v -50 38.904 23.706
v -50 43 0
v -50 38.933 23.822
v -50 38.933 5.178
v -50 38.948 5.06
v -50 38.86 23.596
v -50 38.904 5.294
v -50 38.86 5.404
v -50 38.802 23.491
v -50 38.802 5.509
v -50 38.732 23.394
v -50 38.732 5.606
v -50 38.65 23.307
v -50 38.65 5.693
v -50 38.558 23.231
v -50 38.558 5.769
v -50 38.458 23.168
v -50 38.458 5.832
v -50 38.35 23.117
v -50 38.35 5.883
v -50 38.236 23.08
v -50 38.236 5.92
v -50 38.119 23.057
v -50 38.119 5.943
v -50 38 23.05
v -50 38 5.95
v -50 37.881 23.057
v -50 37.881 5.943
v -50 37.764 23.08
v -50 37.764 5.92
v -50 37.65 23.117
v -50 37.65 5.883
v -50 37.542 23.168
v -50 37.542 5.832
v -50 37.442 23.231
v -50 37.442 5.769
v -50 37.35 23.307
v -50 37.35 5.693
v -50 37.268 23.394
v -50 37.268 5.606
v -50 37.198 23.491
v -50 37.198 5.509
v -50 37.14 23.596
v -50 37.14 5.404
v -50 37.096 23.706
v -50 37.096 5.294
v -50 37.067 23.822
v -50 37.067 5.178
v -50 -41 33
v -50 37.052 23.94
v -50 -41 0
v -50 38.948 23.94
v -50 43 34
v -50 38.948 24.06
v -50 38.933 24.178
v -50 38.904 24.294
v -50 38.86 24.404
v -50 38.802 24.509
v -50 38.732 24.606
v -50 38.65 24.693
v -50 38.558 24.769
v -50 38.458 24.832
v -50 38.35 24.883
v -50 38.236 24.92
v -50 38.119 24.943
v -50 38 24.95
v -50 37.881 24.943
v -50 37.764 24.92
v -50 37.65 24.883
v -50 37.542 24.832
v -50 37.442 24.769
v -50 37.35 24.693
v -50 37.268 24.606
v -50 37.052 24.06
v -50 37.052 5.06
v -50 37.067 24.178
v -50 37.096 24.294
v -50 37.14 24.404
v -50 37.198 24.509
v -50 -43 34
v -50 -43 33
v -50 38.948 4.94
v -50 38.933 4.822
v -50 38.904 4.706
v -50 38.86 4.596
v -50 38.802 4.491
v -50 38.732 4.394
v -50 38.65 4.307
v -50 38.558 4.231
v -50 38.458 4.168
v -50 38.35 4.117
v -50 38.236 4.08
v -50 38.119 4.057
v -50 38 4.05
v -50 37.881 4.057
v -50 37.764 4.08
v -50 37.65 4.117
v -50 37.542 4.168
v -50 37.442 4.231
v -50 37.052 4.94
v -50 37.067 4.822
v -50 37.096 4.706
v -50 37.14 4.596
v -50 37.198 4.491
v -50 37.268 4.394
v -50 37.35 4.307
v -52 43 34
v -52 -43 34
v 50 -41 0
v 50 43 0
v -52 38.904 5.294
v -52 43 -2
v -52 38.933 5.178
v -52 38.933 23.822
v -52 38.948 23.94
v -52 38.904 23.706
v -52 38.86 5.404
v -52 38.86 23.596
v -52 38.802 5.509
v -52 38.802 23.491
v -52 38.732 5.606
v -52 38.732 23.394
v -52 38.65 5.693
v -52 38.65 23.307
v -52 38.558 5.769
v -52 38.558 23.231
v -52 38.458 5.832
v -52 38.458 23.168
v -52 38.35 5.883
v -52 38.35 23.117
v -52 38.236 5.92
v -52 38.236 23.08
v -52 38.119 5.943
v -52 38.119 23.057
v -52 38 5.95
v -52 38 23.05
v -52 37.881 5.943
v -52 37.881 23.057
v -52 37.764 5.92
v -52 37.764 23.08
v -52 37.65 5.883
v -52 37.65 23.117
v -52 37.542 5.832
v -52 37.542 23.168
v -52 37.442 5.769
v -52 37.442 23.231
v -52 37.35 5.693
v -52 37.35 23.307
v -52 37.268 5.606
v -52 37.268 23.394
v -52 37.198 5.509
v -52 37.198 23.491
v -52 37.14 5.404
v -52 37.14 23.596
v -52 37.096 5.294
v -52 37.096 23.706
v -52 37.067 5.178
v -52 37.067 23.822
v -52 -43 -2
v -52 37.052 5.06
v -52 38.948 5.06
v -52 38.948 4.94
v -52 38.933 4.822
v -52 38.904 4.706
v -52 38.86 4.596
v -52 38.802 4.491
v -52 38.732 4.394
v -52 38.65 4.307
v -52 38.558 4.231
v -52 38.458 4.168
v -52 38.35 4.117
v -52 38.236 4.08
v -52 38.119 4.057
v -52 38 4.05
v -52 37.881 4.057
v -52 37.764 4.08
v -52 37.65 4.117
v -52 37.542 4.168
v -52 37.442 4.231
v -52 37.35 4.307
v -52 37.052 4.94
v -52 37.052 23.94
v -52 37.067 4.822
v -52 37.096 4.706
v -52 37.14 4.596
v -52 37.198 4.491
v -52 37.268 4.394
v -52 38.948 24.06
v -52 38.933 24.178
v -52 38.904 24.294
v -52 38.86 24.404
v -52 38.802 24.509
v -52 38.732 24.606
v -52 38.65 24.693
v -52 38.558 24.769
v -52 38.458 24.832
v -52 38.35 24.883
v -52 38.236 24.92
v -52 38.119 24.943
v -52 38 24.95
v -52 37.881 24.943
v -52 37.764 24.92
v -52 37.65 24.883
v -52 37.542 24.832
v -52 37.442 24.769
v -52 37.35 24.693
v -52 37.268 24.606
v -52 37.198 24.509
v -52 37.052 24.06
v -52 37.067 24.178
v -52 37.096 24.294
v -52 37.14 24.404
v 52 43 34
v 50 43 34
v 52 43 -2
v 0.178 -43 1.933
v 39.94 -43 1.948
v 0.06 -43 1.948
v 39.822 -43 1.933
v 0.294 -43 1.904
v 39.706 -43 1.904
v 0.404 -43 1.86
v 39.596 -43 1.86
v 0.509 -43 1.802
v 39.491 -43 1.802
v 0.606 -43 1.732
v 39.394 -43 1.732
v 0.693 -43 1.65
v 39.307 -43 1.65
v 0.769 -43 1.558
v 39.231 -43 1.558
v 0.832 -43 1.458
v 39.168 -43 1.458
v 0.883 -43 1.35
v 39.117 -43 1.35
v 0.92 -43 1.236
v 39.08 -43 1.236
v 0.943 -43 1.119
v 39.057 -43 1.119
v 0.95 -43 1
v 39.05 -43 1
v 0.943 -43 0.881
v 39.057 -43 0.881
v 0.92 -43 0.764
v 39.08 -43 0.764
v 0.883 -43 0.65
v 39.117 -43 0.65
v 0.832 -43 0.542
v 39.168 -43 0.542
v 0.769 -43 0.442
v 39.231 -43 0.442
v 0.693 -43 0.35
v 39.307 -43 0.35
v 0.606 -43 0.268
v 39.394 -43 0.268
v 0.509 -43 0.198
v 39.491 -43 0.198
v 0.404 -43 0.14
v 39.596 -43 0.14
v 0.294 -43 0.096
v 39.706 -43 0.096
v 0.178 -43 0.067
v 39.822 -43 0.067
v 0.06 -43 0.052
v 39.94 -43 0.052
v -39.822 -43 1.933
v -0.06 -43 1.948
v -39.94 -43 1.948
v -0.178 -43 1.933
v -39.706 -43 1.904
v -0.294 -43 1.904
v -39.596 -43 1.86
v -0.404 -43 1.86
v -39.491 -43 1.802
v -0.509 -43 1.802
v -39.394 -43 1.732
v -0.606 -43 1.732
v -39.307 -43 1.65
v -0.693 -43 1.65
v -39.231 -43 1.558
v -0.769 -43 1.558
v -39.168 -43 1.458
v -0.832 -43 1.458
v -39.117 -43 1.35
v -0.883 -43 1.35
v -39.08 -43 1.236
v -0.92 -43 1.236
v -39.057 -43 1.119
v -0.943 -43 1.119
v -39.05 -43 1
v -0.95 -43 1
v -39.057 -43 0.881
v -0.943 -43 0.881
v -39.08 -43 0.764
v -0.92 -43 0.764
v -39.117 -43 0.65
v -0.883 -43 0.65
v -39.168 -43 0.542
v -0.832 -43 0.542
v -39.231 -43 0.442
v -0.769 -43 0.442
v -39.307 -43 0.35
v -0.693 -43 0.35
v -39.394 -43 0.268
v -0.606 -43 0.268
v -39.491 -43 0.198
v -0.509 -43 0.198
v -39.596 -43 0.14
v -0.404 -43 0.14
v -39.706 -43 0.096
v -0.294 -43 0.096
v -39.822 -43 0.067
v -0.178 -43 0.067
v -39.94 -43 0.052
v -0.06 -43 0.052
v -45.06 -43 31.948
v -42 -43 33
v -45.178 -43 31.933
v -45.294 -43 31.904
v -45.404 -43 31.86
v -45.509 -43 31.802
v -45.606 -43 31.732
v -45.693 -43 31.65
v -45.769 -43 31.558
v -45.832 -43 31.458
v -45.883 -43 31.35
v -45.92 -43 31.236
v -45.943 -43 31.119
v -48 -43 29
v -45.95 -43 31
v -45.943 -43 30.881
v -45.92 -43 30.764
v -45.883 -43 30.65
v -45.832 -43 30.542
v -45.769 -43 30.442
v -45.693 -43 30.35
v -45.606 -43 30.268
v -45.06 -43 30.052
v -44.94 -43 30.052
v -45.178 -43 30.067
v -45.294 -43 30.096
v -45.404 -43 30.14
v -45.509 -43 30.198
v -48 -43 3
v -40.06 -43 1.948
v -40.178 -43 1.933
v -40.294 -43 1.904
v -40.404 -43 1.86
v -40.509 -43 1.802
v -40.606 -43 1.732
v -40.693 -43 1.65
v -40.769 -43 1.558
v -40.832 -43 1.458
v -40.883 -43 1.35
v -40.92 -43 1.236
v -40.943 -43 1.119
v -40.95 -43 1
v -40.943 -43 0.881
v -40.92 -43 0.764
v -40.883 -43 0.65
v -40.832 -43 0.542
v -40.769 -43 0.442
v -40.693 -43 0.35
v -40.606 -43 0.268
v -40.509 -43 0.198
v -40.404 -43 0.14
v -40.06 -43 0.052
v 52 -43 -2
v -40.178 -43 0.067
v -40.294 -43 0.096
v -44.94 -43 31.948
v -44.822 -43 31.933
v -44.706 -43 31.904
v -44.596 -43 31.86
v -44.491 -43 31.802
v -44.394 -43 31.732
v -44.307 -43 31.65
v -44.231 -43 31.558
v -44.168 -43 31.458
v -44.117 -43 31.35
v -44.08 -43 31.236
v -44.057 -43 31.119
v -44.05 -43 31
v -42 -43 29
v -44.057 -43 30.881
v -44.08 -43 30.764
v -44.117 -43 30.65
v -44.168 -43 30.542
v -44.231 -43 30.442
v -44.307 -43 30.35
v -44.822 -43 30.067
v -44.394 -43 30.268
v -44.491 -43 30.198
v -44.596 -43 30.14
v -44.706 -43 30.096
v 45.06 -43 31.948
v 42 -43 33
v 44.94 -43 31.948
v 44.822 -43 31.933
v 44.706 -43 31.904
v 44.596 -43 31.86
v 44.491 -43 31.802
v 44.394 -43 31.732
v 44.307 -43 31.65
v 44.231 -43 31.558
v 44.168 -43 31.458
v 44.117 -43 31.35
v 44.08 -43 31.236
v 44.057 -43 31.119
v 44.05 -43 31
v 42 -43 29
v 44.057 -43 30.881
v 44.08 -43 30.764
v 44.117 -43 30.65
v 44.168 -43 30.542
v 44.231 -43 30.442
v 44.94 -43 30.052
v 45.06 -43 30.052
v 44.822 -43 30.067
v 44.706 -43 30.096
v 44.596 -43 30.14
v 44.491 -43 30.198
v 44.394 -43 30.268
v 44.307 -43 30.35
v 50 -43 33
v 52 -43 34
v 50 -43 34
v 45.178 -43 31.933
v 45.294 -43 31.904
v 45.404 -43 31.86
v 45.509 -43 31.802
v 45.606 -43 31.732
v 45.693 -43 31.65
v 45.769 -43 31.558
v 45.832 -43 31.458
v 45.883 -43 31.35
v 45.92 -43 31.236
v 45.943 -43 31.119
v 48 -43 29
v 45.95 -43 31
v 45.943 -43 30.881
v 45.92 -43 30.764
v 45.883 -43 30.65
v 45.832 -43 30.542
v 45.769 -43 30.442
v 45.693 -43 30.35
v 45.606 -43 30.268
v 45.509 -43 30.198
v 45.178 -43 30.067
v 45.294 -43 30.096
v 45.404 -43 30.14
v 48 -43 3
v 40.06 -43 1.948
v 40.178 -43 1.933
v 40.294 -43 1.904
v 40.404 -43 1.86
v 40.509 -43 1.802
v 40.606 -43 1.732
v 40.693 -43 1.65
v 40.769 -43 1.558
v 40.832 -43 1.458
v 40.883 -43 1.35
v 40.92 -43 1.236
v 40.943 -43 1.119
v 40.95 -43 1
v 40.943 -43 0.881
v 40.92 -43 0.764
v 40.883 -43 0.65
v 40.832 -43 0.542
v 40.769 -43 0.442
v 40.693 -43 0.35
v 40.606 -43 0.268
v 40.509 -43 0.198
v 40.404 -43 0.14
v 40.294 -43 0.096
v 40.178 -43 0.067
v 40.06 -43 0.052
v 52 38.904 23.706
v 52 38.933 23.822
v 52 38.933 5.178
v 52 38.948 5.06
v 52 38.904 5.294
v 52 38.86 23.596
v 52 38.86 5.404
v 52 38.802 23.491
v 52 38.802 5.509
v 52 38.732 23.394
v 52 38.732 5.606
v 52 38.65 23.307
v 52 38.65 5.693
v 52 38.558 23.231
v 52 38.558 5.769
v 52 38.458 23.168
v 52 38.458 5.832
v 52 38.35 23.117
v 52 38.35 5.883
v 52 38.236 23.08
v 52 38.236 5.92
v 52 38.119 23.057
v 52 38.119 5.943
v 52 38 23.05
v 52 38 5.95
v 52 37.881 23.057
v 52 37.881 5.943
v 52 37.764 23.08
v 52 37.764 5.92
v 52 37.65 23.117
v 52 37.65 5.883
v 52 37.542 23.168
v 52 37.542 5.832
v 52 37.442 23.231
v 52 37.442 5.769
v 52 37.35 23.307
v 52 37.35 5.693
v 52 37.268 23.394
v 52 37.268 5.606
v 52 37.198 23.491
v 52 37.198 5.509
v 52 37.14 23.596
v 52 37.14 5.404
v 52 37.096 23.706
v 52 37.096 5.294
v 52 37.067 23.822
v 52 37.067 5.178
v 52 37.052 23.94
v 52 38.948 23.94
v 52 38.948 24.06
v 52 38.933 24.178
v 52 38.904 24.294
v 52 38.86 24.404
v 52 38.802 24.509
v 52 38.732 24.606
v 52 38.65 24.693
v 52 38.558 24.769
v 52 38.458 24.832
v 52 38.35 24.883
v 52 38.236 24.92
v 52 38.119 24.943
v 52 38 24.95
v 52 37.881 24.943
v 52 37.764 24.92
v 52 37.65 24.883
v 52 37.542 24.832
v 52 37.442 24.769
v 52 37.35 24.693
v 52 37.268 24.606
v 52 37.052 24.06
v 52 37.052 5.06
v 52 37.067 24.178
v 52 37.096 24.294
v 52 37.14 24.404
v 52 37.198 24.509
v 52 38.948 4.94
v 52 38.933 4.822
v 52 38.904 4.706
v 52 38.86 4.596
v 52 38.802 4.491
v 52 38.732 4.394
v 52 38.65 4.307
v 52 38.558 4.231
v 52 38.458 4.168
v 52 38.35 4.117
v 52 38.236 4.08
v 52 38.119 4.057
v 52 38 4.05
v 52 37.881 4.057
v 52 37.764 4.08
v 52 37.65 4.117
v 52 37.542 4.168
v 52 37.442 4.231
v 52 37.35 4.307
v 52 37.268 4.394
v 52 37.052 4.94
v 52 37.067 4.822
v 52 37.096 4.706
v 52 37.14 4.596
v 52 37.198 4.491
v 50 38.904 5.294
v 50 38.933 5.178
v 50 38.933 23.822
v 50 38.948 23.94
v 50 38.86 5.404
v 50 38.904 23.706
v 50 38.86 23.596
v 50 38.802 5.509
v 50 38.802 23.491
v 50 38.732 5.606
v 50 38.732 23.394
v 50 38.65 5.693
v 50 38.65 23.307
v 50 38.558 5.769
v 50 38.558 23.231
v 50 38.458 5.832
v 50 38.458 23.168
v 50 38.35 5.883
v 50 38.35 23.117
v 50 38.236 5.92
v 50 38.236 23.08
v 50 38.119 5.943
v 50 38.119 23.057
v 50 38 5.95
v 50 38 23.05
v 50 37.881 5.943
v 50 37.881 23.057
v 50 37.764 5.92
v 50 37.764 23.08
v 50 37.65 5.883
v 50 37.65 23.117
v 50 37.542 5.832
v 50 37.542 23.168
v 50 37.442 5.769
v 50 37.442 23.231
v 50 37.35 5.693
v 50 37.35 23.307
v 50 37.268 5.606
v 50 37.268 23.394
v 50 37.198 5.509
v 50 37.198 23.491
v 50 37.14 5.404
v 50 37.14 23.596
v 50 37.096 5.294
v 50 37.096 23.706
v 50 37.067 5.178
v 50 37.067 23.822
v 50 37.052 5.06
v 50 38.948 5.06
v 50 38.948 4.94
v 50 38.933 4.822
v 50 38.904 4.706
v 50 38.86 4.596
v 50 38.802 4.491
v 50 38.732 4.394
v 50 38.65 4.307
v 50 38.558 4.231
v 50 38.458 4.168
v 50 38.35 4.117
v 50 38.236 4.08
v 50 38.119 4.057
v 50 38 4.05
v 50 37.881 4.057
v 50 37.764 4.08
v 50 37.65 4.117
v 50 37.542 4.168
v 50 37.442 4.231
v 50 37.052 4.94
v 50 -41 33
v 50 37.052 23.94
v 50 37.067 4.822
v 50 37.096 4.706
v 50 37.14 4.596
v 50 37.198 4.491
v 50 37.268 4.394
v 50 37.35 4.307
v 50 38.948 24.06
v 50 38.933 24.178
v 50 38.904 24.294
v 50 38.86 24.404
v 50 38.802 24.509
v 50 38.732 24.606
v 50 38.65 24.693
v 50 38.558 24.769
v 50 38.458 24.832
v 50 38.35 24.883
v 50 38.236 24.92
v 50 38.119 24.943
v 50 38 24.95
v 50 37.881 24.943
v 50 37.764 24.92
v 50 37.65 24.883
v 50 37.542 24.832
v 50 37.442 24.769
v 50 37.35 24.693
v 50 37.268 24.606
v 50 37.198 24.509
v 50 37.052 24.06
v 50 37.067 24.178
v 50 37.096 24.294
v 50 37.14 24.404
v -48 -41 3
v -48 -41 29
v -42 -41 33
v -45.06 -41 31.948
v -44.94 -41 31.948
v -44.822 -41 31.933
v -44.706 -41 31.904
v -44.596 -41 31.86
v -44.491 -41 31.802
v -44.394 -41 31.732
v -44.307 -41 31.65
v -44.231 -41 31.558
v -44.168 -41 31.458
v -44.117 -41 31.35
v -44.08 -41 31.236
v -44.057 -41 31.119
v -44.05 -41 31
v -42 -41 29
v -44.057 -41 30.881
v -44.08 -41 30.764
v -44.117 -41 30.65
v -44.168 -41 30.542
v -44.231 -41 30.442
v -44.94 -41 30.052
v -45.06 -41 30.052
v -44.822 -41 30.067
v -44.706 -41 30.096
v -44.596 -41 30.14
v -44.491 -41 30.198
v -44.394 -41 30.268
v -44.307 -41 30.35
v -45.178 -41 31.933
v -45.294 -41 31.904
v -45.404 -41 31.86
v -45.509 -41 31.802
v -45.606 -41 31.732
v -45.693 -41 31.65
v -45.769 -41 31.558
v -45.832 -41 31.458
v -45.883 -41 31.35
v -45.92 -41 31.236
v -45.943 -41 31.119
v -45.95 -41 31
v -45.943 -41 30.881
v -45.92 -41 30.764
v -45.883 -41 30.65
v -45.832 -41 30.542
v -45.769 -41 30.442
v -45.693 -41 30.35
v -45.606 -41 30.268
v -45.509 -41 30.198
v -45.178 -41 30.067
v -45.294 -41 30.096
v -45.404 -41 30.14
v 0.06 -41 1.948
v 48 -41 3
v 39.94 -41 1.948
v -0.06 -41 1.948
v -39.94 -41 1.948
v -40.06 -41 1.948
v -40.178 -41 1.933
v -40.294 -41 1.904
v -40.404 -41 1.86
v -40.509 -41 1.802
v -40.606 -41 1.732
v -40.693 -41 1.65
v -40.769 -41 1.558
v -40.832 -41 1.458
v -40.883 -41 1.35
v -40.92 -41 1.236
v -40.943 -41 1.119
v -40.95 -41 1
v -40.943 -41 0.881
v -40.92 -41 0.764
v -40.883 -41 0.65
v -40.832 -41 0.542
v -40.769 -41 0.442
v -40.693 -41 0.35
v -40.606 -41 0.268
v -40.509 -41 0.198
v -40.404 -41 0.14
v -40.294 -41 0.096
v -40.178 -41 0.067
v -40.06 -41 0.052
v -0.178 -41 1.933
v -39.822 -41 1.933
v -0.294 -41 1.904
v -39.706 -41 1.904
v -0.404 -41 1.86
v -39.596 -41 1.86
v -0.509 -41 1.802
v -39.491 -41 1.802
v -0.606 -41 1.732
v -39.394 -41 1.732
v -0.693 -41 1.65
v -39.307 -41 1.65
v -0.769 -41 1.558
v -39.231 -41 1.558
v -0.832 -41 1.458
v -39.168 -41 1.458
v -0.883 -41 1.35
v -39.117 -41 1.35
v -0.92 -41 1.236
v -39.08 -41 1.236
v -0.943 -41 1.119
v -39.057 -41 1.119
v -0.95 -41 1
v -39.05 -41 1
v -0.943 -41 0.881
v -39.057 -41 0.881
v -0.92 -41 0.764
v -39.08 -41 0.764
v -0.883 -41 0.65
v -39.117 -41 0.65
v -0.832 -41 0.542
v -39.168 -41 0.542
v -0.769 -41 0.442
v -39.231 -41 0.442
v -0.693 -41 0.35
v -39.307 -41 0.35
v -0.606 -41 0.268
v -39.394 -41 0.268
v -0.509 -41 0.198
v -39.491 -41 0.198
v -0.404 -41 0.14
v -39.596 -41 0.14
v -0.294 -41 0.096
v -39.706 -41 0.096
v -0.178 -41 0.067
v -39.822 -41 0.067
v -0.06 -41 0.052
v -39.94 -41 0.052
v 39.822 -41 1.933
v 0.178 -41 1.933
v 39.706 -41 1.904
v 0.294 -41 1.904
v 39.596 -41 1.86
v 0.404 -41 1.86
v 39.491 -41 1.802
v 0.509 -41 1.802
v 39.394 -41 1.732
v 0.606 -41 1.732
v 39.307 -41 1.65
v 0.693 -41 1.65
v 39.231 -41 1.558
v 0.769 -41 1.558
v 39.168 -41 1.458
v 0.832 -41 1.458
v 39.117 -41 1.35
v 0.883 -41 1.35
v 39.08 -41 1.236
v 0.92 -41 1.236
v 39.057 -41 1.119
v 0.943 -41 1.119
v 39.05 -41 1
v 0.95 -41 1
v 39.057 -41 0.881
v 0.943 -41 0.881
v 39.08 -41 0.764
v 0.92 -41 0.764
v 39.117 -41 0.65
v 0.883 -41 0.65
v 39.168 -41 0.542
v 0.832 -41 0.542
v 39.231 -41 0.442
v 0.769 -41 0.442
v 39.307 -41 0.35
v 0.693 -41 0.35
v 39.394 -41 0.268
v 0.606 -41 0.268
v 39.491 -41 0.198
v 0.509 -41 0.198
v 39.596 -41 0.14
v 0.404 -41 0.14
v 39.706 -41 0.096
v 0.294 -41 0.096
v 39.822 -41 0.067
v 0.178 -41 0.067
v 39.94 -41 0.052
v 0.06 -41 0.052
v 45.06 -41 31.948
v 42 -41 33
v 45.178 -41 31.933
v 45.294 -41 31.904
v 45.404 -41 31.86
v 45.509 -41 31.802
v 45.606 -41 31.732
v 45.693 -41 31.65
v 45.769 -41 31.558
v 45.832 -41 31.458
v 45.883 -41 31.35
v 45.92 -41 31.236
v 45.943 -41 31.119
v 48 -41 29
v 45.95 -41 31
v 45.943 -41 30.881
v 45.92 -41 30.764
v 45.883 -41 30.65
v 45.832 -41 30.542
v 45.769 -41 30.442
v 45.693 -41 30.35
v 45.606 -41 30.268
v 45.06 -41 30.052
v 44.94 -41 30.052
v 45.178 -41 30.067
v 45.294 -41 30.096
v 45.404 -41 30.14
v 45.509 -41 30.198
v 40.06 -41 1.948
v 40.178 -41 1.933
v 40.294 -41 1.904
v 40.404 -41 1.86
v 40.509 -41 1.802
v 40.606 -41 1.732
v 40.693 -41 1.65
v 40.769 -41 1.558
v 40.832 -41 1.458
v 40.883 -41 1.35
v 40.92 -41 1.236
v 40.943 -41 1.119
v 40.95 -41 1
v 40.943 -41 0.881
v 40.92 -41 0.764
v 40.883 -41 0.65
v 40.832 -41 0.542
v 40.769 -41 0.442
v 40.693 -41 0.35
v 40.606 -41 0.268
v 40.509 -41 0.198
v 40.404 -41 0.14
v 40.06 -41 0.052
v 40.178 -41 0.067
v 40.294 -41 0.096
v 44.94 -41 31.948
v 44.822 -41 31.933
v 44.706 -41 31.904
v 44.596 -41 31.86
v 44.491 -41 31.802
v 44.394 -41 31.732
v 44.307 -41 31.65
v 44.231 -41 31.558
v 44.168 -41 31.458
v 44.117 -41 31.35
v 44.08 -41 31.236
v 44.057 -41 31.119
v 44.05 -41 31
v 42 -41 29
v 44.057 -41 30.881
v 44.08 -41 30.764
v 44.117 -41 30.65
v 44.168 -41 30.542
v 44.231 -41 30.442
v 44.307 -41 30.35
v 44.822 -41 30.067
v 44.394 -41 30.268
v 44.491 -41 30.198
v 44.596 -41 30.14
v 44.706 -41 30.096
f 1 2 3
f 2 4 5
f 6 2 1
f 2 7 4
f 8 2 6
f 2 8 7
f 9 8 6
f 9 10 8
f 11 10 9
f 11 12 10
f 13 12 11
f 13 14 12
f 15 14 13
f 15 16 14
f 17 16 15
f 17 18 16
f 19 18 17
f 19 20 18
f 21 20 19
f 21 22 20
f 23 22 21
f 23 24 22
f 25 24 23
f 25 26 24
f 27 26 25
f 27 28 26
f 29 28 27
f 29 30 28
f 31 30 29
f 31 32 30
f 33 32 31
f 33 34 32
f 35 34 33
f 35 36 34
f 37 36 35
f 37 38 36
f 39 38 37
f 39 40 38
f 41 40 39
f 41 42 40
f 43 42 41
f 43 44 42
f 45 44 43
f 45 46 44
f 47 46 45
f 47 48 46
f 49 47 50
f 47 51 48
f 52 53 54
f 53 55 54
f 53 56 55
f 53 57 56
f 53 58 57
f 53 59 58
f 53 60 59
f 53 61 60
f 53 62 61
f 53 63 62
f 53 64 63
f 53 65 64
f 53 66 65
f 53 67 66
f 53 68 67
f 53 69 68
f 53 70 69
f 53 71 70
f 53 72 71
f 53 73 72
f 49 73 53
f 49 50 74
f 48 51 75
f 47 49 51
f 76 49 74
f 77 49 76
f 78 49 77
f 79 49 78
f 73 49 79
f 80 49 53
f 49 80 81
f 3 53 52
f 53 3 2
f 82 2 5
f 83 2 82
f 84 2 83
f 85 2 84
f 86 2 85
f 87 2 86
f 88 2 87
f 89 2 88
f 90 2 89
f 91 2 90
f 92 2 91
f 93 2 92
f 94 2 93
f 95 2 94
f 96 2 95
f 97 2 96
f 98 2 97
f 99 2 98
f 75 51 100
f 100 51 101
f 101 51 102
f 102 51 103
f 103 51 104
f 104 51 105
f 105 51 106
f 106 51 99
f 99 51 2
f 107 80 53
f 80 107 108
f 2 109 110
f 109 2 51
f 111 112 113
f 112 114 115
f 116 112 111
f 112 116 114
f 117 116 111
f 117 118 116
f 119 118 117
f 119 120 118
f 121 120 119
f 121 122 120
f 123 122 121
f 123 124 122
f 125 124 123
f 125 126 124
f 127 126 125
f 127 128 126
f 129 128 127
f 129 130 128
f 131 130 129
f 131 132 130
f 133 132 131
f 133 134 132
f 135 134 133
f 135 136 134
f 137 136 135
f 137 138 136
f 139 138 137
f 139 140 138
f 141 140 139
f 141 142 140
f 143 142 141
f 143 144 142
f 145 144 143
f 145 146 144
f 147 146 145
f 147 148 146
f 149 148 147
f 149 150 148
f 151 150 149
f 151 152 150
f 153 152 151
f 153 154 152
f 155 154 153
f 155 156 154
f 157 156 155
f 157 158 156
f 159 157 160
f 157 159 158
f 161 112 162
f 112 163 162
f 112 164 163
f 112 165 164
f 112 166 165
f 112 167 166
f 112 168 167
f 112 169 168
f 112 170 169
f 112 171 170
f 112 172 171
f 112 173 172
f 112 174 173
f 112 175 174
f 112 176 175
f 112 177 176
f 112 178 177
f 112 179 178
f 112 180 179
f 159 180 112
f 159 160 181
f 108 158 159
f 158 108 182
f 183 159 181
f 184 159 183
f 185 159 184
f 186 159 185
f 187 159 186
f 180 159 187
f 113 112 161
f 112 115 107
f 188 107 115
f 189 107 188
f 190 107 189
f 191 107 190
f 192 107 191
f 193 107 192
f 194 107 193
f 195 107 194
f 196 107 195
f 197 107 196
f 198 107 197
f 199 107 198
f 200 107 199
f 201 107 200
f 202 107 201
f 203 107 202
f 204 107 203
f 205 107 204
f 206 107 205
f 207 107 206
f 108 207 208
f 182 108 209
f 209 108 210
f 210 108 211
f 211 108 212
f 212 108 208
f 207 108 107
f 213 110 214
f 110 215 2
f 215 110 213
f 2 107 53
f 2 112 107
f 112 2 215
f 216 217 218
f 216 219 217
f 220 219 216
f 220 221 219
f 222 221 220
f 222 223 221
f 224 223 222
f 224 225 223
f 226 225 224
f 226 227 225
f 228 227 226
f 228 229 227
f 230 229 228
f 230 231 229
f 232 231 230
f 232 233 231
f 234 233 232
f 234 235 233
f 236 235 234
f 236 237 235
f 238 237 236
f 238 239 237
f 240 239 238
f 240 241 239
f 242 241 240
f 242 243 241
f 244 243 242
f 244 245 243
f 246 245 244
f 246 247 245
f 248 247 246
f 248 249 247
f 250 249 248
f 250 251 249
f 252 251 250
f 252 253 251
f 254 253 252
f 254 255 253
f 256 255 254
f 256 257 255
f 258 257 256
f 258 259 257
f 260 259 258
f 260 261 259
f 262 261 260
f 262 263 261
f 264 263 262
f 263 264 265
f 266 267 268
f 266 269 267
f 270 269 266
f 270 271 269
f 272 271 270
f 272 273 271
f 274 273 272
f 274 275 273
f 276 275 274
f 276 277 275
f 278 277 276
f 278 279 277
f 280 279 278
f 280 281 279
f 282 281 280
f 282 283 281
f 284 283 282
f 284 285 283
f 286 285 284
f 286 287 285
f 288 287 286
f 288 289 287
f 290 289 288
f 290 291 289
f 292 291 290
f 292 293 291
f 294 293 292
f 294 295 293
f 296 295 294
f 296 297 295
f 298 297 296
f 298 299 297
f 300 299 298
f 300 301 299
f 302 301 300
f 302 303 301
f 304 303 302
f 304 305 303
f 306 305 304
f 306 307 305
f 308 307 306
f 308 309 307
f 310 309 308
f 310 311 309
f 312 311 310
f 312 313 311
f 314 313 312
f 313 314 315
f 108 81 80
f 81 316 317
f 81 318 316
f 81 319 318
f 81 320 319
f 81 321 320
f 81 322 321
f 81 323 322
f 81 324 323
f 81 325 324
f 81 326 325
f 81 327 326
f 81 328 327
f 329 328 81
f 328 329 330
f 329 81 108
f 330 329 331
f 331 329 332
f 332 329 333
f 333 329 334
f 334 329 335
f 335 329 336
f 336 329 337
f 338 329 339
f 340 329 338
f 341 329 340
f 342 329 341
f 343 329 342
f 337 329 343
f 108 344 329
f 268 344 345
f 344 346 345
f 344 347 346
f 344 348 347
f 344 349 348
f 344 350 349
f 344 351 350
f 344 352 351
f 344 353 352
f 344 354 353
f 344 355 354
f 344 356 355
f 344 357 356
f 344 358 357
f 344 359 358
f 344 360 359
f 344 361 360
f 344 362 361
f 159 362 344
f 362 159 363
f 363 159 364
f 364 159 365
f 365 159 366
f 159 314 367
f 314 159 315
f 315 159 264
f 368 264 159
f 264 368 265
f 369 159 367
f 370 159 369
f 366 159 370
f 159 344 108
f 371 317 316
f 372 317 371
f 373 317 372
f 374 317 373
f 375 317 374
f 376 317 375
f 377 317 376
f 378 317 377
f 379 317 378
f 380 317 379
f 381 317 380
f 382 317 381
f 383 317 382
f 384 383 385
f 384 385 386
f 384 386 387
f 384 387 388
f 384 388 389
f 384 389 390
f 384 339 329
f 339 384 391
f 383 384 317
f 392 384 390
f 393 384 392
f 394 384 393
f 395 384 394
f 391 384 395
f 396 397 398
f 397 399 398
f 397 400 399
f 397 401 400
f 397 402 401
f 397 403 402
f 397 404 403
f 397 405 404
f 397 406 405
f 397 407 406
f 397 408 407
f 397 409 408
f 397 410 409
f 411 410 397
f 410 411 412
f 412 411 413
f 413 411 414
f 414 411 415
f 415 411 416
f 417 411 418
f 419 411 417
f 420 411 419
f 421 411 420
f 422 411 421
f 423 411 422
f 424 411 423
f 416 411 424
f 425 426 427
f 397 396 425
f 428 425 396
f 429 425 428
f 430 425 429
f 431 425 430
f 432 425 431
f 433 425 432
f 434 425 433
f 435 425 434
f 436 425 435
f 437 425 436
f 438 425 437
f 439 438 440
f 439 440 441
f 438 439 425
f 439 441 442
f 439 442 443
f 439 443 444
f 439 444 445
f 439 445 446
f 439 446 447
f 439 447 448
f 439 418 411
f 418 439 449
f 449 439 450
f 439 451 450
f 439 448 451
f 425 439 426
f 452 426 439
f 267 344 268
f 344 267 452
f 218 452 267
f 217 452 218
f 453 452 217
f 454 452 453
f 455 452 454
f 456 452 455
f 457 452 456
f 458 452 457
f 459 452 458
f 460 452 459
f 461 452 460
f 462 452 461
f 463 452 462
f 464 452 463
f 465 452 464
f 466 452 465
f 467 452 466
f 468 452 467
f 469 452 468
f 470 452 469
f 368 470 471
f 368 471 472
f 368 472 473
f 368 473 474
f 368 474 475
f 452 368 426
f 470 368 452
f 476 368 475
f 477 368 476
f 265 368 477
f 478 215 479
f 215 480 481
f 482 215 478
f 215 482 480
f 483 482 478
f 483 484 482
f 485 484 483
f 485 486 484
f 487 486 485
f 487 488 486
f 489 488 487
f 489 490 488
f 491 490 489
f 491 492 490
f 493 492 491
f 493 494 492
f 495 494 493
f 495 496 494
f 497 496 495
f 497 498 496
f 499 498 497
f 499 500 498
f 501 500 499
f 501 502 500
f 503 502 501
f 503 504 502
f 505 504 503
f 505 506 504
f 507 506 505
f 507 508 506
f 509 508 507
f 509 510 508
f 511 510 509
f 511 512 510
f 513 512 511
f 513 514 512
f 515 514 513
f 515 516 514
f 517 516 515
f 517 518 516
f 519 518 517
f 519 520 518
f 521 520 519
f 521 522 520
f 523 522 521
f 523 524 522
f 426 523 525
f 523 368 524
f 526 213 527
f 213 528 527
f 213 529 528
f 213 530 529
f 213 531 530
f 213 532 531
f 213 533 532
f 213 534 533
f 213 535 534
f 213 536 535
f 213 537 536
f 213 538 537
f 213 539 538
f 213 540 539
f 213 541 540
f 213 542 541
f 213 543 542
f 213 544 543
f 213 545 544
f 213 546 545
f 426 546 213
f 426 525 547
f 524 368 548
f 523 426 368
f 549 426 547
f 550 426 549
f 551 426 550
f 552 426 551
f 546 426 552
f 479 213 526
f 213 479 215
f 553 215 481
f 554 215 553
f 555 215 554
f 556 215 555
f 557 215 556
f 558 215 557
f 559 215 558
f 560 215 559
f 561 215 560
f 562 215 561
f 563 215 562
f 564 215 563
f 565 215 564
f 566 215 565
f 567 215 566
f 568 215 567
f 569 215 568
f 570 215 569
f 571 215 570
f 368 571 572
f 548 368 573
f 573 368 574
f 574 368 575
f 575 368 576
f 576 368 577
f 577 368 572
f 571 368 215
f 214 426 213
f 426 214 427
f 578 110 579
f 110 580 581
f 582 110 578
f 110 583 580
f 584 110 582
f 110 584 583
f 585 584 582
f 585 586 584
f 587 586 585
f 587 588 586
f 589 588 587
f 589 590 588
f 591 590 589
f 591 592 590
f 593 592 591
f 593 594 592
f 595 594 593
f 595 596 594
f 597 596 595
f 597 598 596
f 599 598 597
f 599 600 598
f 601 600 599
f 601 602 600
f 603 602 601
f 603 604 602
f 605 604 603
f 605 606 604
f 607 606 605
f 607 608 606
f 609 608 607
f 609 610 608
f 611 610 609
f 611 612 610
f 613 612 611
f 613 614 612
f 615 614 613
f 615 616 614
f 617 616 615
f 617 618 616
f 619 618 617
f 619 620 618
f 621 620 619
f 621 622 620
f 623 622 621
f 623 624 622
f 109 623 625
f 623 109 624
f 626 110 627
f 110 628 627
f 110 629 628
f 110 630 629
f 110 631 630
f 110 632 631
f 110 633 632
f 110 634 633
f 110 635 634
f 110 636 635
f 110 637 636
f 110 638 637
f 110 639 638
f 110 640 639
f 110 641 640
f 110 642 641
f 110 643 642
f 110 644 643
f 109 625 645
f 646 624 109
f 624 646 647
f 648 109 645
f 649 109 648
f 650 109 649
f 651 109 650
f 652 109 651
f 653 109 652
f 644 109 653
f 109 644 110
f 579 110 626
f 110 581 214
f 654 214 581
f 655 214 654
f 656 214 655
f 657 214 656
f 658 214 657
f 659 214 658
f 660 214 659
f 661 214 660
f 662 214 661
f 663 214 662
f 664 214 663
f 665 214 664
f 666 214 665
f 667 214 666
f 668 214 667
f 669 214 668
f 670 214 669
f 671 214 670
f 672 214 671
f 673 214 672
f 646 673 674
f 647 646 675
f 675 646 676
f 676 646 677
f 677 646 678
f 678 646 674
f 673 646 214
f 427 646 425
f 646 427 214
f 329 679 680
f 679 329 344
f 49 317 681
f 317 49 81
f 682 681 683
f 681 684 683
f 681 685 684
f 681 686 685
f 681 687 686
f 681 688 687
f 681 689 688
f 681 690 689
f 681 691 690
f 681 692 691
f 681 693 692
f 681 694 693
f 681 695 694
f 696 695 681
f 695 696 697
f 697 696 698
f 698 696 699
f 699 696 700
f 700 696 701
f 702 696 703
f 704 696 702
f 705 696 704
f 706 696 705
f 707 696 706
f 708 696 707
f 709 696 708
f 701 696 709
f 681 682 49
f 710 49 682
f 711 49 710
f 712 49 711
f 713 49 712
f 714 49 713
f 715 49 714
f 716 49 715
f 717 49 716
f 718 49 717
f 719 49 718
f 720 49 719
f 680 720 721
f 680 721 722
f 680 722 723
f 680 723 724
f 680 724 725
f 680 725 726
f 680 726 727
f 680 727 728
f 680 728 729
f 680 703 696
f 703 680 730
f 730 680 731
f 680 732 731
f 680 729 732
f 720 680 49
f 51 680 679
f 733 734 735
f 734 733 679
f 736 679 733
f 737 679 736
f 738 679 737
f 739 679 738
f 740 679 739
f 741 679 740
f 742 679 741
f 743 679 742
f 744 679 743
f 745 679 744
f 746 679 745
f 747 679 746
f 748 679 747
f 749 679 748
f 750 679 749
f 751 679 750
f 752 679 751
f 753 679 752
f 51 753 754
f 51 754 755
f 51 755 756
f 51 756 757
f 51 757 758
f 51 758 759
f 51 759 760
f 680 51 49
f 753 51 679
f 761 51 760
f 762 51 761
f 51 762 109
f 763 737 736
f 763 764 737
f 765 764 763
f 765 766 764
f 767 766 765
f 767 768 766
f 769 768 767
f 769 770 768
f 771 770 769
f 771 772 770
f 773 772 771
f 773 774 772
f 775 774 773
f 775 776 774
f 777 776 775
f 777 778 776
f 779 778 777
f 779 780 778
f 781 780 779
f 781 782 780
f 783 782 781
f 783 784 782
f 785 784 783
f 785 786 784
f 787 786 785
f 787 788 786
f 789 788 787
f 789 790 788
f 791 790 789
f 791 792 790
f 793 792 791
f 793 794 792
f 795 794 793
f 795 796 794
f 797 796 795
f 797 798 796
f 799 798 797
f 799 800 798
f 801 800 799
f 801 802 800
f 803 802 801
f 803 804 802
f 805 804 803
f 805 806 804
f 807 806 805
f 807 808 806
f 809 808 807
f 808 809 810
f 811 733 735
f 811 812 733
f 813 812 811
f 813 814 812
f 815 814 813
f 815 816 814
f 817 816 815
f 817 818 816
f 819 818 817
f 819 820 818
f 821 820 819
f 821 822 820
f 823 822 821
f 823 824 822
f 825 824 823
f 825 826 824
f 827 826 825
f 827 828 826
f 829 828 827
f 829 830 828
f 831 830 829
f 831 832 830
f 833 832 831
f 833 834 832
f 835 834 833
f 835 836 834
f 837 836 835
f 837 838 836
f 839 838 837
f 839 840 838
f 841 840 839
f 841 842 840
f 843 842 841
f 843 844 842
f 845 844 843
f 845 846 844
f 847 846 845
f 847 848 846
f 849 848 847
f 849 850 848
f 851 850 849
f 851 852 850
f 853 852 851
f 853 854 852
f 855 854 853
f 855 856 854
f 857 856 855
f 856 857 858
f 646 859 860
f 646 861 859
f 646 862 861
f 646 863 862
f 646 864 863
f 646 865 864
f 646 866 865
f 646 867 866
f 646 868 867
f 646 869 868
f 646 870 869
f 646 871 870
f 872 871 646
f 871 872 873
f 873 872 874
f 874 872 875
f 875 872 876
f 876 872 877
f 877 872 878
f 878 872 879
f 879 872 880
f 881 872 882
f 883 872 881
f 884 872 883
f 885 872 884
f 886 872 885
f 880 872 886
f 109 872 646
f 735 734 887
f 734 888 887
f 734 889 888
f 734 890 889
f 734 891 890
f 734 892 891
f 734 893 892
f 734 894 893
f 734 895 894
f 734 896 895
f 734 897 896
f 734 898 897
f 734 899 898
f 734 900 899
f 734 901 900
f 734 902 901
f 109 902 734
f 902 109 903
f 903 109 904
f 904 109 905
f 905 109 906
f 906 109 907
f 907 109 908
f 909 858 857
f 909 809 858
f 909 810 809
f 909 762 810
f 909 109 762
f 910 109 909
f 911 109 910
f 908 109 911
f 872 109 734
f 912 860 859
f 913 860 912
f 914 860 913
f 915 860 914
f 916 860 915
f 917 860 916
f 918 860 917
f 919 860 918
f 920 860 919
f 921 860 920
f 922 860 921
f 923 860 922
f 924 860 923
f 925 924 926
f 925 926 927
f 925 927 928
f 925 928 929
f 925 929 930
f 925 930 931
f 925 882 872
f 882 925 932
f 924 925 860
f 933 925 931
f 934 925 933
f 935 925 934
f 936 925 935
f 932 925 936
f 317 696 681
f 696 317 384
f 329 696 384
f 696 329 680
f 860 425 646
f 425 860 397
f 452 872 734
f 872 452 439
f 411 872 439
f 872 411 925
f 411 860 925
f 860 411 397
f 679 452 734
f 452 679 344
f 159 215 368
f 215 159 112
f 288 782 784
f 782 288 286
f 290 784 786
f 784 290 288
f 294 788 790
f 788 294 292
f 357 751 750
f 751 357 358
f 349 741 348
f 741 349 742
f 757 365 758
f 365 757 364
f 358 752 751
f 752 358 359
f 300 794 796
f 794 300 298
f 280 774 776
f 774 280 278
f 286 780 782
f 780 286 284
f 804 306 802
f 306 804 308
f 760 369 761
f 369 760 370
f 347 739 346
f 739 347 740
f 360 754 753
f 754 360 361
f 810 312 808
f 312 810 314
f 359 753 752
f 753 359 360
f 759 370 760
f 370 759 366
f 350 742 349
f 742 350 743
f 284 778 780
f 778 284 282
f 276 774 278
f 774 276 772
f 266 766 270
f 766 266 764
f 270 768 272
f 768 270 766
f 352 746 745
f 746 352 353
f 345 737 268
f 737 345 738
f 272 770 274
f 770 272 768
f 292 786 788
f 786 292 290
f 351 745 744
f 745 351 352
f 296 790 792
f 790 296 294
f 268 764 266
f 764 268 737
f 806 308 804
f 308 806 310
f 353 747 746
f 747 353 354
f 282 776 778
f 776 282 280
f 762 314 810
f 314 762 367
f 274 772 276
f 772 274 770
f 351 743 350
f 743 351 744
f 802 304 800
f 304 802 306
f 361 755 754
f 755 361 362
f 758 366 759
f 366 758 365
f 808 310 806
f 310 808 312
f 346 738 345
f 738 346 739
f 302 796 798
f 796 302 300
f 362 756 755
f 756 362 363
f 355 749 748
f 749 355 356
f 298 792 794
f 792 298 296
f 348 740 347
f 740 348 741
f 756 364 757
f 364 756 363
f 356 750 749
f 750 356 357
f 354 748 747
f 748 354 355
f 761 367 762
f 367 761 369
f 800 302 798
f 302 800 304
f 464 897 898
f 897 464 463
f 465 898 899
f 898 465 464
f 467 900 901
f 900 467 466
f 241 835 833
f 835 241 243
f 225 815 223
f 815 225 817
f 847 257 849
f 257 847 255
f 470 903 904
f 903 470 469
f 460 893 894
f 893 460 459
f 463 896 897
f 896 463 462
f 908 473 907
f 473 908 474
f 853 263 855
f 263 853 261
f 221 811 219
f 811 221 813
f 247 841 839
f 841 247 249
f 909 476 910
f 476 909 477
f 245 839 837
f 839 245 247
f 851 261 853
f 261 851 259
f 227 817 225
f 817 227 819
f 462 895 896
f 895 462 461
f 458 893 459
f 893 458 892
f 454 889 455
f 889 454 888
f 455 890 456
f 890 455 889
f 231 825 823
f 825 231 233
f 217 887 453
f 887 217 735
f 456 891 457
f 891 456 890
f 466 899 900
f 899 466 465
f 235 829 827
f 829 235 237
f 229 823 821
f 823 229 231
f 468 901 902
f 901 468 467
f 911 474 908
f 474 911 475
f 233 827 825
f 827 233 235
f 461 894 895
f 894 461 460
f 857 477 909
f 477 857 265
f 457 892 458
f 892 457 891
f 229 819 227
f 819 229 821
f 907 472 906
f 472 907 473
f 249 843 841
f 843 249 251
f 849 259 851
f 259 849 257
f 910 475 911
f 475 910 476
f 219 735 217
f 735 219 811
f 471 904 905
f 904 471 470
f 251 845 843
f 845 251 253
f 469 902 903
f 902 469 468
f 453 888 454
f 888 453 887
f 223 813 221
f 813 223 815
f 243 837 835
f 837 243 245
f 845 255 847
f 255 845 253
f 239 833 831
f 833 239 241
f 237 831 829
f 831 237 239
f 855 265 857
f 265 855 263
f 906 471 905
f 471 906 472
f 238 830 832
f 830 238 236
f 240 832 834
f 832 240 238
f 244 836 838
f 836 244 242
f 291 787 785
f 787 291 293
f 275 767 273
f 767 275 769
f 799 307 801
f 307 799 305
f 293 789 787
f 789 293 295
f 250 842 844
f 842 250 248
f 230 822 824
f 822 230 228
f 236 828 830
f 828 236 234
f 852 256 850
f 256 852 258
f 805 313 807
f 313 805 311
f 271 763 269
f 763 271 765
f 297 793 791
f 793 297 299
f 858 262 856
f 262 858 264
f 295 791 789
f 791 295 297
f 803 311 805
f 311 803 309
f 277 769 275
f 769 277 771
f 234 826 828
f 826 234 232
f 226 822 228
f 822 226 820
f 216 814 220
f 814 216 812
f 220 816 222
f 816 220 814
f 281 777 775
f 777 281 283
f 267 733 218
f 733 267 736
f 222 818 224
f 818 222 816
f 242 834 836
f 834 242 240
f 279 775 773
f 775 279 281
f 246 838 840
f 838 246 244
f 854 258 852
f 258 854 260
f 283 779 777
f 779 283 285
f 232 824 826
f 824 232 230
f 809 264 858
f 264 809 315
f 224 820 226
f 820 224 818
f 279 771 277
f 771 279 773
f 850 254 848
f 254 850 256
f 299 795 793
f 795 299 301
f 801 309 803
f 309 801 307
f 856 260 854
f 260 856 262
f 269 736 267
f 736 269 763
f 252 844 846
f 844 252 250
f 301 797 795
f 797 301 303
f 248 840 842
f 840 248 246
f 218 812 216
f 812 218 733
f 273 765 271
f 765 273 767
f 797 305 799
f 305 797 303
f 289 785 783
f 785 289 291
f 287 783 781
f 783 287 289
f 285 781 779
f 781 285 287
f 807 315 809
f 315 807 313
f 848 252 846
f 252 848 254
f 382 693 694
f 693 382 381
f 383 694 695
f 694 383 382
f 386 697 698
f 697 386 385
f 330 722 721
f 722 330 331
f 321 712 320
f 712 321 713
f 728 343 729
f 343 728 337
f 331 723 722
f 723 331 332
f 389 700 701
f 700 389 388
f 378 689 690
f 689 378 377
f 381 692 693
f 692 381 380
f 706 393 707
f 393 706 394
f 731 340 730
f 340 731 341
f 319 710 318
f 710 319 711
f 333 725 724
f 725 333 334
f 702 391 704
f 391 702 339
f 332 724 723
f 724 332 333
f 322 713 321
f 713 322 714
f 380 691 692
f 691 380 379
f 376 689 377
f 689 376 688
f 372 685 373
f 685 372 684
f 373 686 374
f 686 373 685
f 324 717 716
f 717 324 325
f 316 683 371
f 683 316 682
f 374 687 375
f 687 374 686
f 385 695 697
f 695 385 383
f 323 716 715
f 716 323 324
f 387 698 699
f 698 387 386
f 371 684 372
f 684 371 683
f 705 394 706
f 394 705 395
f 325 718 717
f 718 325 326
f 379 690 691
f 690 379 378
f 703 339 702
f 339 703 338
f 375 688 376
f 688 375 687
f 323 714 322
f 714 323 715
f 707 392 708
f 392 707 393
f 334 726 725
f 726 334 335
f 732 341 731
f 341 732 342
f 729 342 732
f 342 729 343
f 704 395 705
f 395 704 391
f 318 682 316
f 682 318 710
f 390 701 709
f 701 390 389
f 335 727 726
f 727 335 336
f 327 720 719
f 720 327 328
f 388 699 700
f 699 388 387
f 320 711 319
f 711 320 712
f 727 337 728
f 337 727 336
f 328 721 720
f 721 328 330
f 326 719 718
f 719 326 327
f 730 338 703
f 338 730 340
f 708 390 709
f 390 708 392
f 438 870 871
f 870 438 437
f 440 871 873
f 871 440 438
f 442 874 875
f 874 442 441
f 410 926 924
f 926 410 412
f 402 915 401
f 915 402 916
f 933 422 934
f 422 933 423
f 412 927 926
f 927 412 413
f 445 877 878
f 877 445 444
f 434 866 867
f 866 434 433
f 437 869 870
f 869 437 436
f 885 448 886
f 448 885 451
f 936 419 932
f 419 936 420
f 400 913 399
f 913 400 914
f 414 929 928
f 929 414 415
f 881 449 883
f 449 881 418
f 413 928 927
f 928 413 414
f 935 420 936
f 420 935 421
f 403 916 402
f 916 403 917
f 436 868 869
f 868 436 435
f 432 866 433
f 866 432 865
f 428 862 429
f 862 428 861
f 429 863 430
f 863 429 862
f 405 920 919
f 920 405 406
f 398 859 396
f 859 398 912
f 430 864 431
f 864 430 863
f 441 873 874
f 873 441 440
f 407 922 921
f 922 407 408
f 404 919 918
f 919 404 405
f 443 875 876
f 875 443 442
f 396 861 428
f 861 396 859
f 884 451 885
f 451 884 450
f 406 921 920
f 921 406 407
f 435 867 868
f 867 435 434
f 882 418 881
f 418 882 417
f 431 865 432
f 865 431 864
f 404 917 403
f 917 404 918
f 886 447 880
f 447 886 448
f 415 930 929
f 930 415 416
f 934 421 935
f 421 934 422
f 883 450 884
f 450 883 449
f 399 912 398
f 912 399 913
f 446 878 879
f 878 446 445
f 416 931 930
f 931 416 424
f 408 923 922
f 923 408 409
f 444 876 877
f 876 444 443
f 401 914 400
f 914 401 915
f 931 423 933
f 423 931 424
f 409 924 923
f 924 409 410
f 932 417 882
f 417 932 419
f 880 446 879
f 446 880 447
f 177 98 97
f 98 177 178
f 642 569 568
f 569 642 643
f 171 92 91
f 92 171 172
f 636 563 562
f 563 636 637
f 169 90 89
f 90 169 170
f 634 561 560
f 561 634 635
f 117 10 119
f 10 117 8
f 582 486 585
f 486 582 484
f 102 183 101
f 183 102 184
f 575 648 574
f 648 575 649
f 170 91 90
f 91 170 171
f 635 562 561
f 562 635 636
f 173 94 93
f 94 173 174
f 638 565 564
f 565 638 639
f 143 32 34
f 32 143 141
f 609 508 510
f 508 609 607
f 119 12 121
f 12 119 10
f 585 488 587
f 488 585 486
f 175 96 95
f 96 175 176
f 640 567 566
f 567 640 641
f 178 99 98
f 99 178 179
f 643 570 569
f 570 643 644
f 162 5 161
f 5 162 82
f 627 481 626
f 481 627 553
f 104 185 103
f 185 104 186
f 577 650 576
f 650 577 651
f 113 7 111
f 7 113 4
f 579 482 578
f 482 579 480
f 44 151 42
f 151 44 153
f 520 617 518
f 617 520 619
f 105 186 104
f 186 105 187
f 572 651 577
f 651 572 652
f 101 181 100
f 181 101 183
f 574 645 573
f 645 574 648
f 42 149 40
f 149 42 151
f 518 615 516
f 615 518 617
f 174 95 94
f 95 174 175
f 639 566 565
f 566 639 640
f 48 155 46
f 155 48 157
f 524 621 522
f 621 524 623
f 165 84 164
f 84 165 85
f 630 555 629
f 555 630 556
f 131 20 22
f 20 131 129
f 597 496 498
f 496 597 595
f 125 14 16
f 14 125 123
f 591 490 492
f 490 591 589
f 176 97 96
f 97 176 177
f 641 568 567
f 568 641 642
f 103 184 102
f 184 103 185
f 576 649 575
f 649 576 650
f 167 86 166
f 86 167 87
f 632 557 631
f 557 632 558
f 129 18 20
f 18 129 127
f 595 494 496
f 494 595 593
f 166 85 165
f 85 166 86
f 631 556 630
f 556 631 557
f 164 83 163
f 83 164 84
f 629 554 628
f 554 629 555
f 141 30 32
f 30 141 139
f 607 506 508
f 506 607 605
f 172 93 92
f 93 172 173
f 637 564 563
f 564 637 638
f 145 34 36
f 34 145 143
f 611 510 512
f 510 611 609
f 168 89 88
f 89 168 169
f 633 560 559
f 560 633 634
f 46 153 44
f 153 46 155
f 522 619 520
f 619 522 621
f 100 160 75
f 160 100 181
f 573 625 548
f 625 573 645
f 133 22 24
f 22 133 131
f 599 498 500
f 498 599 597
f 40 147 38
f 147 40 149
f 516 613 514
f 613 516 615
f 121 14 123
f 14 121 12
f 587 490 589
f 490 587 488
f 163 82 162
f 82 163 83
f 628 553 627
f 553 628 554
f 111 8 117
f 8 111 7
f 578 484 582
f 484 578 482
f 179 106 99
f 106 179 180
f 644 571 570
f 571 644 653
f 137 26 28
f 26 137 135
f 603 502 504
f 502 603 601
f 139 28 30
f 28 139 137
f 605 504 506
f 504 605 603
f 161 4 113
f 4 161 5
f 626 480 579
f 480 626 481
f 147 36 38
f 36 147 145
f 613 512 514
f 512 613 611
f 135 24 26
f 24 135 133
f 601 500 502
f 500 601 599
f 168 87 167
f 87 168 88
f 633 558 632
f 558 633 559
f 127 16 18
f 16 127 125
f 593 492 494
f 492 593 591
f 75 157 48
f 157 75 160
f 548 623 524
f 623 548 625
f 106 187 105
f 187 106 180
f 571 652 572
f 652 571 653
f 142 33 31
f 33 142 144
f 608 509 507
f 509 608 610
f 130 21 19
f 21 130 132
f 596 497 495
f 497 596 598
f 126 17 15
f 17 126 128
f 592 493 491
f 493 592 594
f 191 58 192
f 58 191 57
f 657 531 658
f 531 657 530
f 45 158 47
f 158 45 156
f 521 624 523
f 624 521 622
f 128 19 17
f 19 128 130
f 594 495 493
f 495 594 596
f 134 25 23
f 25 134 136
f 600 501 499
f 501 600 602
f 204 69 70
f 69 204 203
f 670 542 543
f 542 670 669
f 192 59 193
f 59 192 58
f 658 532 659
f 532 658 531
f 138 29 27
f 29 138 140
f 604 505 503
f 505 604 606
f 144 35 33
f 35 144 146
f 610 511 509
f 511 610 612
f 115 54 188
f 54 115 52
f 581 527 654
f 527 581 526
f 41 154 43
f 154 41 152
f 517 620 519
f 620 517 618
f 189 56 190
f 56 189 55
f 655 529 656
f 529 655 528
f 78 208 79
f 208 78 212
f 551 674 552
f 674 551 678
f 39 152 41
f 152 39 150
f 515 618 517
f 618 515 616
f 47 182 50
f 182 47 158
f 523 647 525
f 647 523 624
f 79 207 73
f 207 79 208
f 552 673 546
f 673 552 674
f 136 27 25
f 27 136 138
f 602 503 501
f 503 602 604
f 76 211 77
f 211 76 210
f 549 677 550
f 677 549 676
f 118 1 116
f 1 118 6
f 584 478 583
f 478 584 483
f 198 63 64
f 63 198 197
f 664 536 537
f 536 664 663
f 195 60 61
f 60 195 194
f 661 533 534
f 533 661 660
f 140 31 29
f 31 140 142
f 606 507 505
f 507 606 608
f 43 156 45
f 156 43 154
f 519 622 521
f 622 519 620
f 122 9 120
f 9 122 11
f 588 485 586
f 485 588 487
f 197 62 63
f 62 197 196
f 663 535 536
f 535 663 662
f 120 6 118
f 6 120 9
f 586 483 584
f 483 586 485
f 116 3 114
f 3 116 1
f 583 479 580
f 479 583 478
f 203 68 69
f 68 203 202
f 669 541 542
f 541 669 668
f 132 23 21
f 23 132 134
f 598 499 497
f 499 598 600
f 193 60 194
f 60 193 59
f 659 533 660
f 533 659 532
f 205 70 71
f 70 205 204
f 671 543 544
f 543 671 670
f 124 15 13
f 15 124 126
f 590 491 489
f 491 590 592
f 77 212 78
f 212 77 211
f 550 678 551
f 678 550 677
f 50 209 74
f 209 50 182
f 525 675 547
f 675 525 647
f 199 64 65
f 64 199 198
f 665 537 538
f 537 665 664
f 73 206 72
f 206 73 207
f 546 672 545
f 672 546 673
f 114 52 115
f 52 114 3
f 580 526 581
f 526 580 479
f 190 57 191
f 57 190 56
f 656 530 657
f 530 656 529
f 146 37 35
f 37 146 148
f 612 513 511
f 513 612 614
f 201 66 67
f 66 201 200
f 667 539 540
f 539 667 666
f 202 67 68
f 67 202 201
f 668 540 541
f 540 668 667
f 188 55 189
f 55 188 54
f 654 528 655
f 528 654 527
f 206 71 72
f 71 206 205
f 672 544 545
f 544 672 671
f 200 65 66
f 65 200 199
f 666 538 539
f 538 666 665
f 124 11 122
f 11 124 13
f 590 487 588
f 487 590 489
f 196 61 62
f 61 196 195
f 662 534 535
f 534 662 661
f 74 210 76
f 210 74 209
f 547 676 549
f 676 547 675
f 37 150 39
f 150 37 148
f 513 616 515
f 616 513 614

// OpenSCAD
// file: pcb_led_cvf.scad
// for led power module modified

/* bluetooth_mate_holder.scad
 * By John Biehler - November 17, 2011
 * http://www.thingiverse.com/thing: 

 * derived from pcb_box_slide_with_tabs.scad
 * By Nicholas C Lewis - Jan 1, 2011
 * http://www.thingiverse.com/thing:5396 
 *
 * derived from pcb_box_slide.scad 
 *     Parametric, open PCB-box (slide-in) by chlunde
 *     http://www.thingiverse.com/thing:4071
 *
 * CHANGES
 * - adjusted to fit Arduino Mega
 * - added mounting tabs
 * - turned off cutouts
 * - adjusted bottom cutout size
 */

$fn=50;

//Uno is 2.7" x 2.1" which is 68.58 mm x 53.34 mm
//Round up to 69 mm x 54 mm
pcb_width = 48.1;
pcb_length =24.1;
pcb_height =1.0;
slisse = 0.8;

pcb_bottom_margin = 1;
wall_width_thick = 2;
wall_width = wall_width_thick-slisse;
box_height = 7;

//tab parameters
tab_hole_radius=2;
tab_outer_radius=4;

inner_margin = 4;

module pcb_led_cvf() {


  difference() {
    box();
    pcb();
    holes();
  }


}

module tab() {
	difference(){
		union() {
			translate([-tab_outer_radius,-tab_outer_radius,0])
			cube([tab_outer_radius,2*tab_outer_radius,wall_width]);
			translate([-tab_outer_radius,0,0])
				cylinder(r=tab_outer_radius, h = wall_width);
		}
		translate([-tab_outer_radius,0,0])
		 cylinder(r= tab_hole_radius, h = wall_width+3,center=true);
	}

}

module box() {
  union() {
    cube([pcb_width + 2*wall_width, pcb_length + 2*wall_width, wall_width]);

    cube([wall_width_thick, pcb_length + 2*wall_width, box_height]);

    cube([pcb_width + 2*wall_width, wall_width_thick, box_height]);

    %translate([0, pcb_length+wall_width, 0])
      cube([pcb_width + 2*wall_width,wall_width,box_height]);

    translate([pcb_width + wall_width - slisse,0,0])
      cube([wall_width_thick, pcb_length + 2*wall_width, box_height]);
  }
//comment out this part to remove tabs
 for(i=[(pcb_length + 2*wall_width)/2]){
	translate([0,i,0])tab();
	translate([pcb_width + 2*wall_width,i,0])mirror()tab();
 }


}

module pcb() {
  translate([wall_width, wall_width, wall_width + pcb_bottom_margin])
    cube([pcb_width,pcb_length + wall_width + 0.1,pcb_height]);
  translate([wall_width, wall_width, wall_width + pcb_bottom_margin+pcb_height])rotate([0,45,0])
    cube([pcb_height,pcb_length + wall_width + 0.1,pcb_height]);
  translate([wall_width+pcb_width-2*cos(45)*pcb_height, wall_width, wall_width + pcb_bottom_margin+pcb_height])rotate([0,45,0])
    cube([pcb_height,pcb_length + wall_width + 0.1,pcb_height]);
  translate([wall_width_thick, wall_width, wall_width + pcb_bottom_margin])
    cube([pcb_width-2*slisse,pcb_length + wall_width + 0.1,box_height]);

}



module holes() {
    *translate([wall_width + pcb_width/2, wall_width_thick + 0.1, pcb_width/2+wall_width])
      rotate(a=90,v=[1,0,0])
        cylinder(r=pcb_width/2, h=wall_width_thick + 0.2);
  
    *translate([-0.1, wall_width + pcb_length/2, pcb_length/2 + wall_width])
      rotate(a=90,v=[0,1,0])
        cylinder(r=pcb_length/2, h=wall_width_thick + 0.2);
  
    *translate([pcb_width + wall_width - slisse - 0.1, wall_width + pcb_length/2, pcb_length/2 + wall_width])
      rotate(a=90,v=[0,1,0])
        cylinder(r=pcb_length/2, h=wall_width_thick + 0.2);
  
   * translate([pcb_width/2 + wall_width, wall_width + pcb_length/2, -0.1])
      rotate(a=0,v=[0,1,0])
        cylinder(r=min(pcb_length,pcb_width)/2 - wall_width/2, h=wall_width_thick + 0.2);
     
    translate([inner_margin +wall_width, inner_margin+wall_width, -0.1])
      cube([pcb_width-inner_margin*2,pcb_length -inner_margin*2,wall_width + 0.2]);
}


pcb_led_cvf();
// file: led_pcb_holder.scad
use <MCAD/boxes.scad>


$fn = 50;

wall = 2;
int_d = 21;
int_h = 6;
ext_d = int_d + wall * 2;
ext_h = int_h + wall;

hole_d = 4;
ext_size = hole_d+wall+1;

module led_pcb_holder() {

  difference() {
    union() {
      difference() {
        cylinder(d=ext_d, h=ext_h, center = true);
        translate([0, 0, (ext_h-int_h)/2]) {
          cylinder(d=int_d, h=int_h, center = true);
        }
      }
      for(p=[0:60:360]) {
        rotate([0, 0, p+30]) {
          translate([int_d/2, 0, -int_h/2+wall+3]) {
            hull() {
              cube([3, 2, 2], center=true);
              translate([0, 0, -2]) {
                cube([0.1, 2, 2], center=true);
              }
            }
          }
        }
      }
    }
    translate([0, 0, (ext_h-int_h)/2]) {
      for(p=[0:60:360]) {
        rotate([0, 0, p]) {
          translate([int_d/2, 0, 0]) {
            cube([wall*2, 3, int_h], center=true);
          }
        }
      }
    }
  }
  
  
  rotate([0, 0, 30]) {
    translate([0, 0, (-ext_h+wall)/2]) {
      difference() {
        roundedBox([ext_d+ext_size*2, hole_d + wall, wall], wall, true);
        translate([(ext_d+ext_size)/2, 0, 0]) {
          cylinder(d=hole_d, h=50, center=true);
        }
        translate([-(ext_d+ext_size)/2, 0, 0]) {
          cylinder(d=hole_d, h=50, center=true);
        }
      }
    }
  }
}

led_pcb_holder();
// main file
use <led_pcb_holder.scad>
use <pcb_led_cvf.scad>

test_mode = false;

$fn = 50;

int_w = 80;
int_l = 94;

wall = 2;

ext_w = 88;
ext_l = 104;

paper_z = 0.5;

z = 4 + paper_z;

pcb_wall_z = 30 + wall*2;

attach_l = 4;
attach_w = wall;
attach_p_l = 10;
attach_p_z = 4;
attach_hole_d = 1.9;
attach_hole_through_d = 2.5;

module switch_holes() {
  cube([9.5, 50, 5], center=true);
  translate([9.5, 0, 0]) {
    rotate([90, 0, 0]) {
      cylinder(d=2.5, h = 50, center=true);
    }
  }
  translate([-9.5, 0, 0]) {
    rotate([90, 0, 0]) {
      cylinder(d=2.5, h = 50, center=true);
    }
  }
}

module power_side_attachment() {
  translate([0, attach_w-ext_w/2, 0.5]) {
    cube([ext_l, attach_w, attach_p_z+1], center=true);
  }
  translate([attach_l/2-ext_l/2, attach_w-ext_w/2, pcb_wall_z/2-wall/2]) {
    cube([attach_l, attach_w, pcb_wall_z], center=true);
    translate([(attach_p_l-attach_l)/2, 0, (pcb_wall_z-attach_p_z)/2]) {
      cube([attach_p_l, attach_w, attach_p_z], center=true);
    }
  }
  translate([ext_l/2-attach_l/2, attach_w-ext_w/2, pcb_wall_z/2-wall/2]) {
    cube([attach_l, attach_w, pcb_wall_z], center=true);
    translate([(attach_l-attach_p_l)/2, 0, (pcb_wall_z-attach_p_z)/2]) {
      cube([attach_p_l, attach_w, attach_p_z], center=true);
    }
  }
}

module paper_holder() {
  difference() {
    union() {
      difference() {
        cube([ext_l, ext_w, z], center=true);
        cube([int_l, ext_w, z], center=true);
        cube([ext_l, ext_w-4, paper_z], center=true);
      }
      power_side_attachment();
    }
    attach_holes(through=false);
  }
}

module box4light() {
  difference() {
    union() {
      translate([0, 0, -wall/2]) {
        cube([ext_l, ext_w-wall, wall], center=true);
      }
      for(l_pos=[-ext_l/2+wall/2,ext_l/2-wall/2]) {
        translate([l_pos, 0, pcb_wall_z/2]) {
          cube([wall, ext_w-wall, pcb_wall_z], center=true);
        }
      }
      power_side_attachment();
    }
    attach_holes(through=false);
  }
}

module attach_holes(through=true) {
  d = through ? attach_hole_through_d : attach_hole_d;
  for(p=[
      [-int_w/2, 1],
      [int_w/2, 1],
      [0, 1],
      [-int_w/2-5, pcb_wall_z-(attach_p_z+wall)/2],
      [int_w/2+5, pcb_wall_z-(attach_p_z+wall)/2],
      ]) {
    translate([p[0], 0, p[1]]) {
      rotate([90, 0, 0]) {
        cylinder(d=d, h=ext_w*2, center=true);
      }
    }
  }
  for(p=[5,pcb_wall_z-10]) {
    translate([0, ext_l/2-14, p]) {
      rotate([0, 90, 0]) {
        cylinder(d=d, h=ext_l*2, center=true);
      }
    }
  }
}

module power_side() {
  difference() {
    translate([0, -ext_w/2, (pcb_wall_z-wall)/2]) {
      cube([ext_l, wall, pcb_wall_z+wall], center = true);
    }
    // holes for led holder
    translate([16, 0, 0]) {
      a_hole();
    }
    translate([-16, 0, 0]) {
      a_hole();
    }
    // holes for led power pcb
    translate([29, 0, -1]) {
      a_hole();
    }
    translate([-29.5, 0, -1]) {
      a_hole();
    }
    // holes for wires
    translate([-14, 0, -6]) {
      a_hole(4);
    }
    translate([14, 0, 5]) {
      a_hole(4);
    }
    // wires for switch
    translate([30, 0, 7]) {
      a_hole(4);
    }
    translate([30, 0, -9]) {
      a_hole(4);
    }
    // wires for socket (
    translate([-30, 0, 7]) {
      a_hole(4);
    }
    translate([-30, 0, -9]) {
      a_hole(4);
    }
    // power hole
    translate([-42, 0, 0]) {
      a_hole(d=8.8);
    }
    // switch
    translate([42, -40, 15]) {
      rotate([0, 90, 0]) {
        switch_holes();
      }
    }
    attach_holes(through=true);
  }
}

module a_hole(d=3.2, h=50) {
  translate([0, -ext_w/2, pcb_wall_z/2]) {
    rotate([90, 0, 0]) {
      cylinder(d=d, h=h, center=true);
    }
  }
}

module led_light_box(paper=false) {

  difference() {
  //union() {
    if(paper) {
      paper_holder();
    } else {
      box4light();
    }
  }
  
  if(test_mode) {
    color("blue")
    translate([0, -int_w/2, pcb_wall_z/2]) {
      rotate([-90, -30, 0]) {
        led_pcb_holder();
      }
    }
    
    color("green")
    translate([25, -ext_w/2, pcb_wall_z-5]) {
      rotate([90, 180, 0]) {
        pcb_led_cvf();
      }
    }
  }
  
}

led_light_box(paper=false);
//power_side();
